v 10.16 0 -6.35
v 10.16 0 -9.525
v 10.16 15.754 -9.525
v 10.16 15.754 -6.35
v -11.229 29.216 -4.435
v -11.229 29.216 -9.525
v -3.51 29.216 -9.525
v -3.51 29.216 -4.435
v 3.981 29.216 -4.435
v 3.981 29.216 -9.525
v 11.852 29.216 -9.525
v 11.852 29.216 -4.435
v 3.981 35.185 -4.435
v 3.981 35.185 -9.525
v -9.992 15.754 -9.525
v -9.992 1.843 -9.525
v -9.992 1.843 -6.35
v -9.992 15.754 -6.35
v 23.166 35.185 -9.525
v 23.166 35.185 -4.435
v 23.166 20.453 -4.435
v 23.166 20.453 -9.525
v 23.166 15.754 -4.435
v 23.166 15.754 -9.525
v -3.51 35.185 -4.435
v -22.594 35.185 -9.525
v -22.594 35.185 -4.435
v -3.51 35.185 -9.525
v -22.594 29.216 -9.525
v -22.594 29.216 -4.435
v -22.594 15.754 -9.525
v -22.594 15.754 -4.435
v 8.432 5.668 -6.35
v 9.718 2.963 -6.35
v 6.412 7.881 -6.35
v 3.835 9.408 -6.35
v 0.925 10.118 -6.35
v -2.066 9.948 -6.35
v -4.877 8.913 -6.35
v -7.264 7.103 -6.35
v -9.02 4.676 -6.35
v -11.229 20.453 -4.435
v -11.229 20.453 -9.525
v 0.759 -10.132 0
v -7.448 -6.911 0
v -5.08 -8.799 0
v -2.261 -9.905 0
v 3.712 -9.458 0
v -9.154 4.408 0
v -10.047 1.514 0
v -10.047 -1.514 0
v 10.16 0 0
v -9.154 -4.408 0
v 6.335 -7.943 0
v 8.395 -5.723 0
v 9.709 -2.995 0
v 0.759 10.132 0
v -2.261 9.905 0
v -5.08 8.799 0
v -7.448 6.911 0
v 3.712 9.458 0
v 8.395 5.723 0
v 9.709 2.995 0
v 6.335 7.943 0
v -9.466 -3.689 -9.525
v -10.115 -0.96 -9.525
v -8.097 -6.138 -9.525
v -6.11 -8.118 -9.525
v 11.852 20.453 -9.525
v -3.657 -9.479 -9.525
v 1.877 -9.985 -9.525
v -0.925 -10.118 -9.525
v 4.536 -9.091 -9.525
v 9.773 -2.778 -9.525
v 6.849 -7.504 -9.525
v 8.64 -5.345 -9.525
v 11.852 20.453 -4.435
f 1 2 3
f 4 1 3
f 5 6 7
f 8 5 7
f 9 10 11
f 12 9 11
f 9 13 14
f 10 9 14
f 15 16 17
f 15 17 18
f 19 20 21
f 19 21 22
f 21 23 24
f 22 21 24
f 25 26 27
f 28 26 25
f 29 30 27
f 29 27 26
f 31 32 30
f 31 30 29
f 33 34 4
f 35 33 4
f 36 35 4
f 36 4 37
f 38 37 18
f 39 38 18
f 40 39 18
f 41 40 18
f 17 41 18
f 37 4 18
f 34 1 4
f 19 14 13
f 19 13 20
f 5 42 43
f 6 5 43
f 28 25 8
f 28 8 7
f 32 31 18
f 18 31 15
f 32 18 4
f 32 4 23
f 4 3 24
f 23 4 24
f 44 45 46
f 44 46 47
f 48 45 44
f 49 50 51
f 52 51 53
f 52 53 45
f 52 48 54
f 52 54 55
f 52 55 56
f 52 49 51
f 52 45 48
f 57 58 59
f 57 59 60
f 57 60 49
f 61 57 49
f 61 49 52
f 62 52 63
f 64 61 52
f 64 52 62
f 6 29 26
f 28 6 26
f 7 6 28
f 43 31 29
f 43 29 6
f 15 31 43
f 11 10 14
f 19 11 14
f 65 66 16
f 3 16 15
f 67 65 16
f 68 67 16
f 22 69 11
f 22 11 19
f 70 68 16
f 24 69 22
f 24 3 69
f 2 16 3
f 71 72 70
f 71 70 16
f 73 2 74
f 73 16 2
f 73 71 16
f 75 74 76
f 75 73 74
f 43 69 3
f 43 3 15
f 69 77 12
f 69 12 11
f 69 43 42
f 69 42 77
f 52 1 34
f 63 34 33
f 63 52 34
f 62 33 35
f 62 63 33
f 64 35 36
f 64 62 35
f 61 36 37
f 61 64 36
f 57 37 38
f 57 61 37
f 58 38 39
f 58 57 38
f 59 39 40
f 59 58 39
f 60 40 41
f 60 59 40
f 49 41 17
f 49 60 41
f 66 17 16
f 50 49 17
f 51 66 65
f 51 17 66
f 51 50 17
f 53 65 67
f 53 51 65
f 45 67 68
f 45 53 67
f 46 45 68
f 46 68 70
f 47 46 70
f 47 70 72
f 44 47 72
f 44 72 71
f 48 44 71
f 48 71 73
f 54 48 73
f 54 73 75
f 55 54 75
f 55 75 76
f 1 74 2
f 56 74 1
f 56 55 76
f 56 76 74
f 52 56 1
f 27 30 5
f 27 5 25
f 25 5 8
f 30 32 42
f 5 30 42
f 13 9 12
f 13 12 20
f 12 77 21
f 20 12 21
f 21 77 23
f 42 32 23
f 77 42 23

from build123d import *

# Parameters (mm, degrees)
SKETCH1_R           = 10.16
BOSS_EXTRUDE1_DEPTH = 9.525
SKETCH2_W           = 20.151524415
SKETCH2_H           = 15.754496301
BOSS_EXTRUDE4_DEPTH = 3.175
BOSS_EXTRUDE5_DEPTH = 4.699
SKETCH4_W           = 11.36474419
SKETCH4_H           = 5.089940764
SKETCH4_W_2         = 11.314127359
BOSS_EXTRUDE6_DEPTH = 8.763
SKETCH5_W           = 19.083811061
SKETCH5_H           = 5.089940764
SKETCH5_W_2         = 19.185044725
BOSS_EXTRUDE7_DEPTH = 5.969


with BuildPart() as part:
    # Sketch1 → Boss-Extrude1 (new body)
    with BuildSketch(Plane.XY):
        Circle(SKETCH1_R)
    extrude(amount=-BOSS_EXTRUDE1_DEPTH)

    # Sketch2 → Boss-Extrude4 (add)
    with BuildSketch(Plane(origin=(0, 0, -9.525), x_dir=(-1, 0, 0), z_dir=(0, 0, -1))):
        with Locations((-0.084237792, 7.877248151)):
            Rectangle(SKETCH2_W, SKETCH2_H)
    extrude(amount=-BOSS_EXTRUDE4_DEPTH)

    # Sketch3 → Boss-Extrude5 (add)
    with BuildSketch(Plane(origin=(0, 15.754496301, 0), x_dir=(1, 0, 0), z_dir=(0, 1, 0))):
        Polygon((-9.991524415, 9.525), (-22.594029854, 9.525), (-22.594029854, 4.435059236), (23.166117059, 4.435059236), (23.166117059, 9.525), align=None)
    extrude(amount=BOSS_EXTRUDE5_DEPTH)

    # Sketch4 → Boss-Extrude6 (add)
    with BuildSketch(Plane(origin=(0, 20.453496301, 0), x_dir=(1, 0, 0), z_dir=(0, 1, 0))):
        with Locations((-16.911657759, 6.980029618)):
            Rectangle(SKETCH4_W, SKETCH4_H)
        with Locations((17.50905338, 6.980029618)):
            Rectangle(SKETCH4_W_2, SKETCH4_H)
    extrude(amount=BOSS_EXTRUDE6_DEPTH)

    # Sketch5 → Boss-Extrude7 (add)
    with BuildSketch(Plane(origin=(0, 29.216496301, 0), x_dir=(1, 0, 0), z_dir=(0, 1, 0))):
        with Locations((-13.052124324, 6.980029618)):
            Rectangle(SKETCH5_W, SKETCH5_H)
        with Locations((13.573594697, 6.980029618)):
            Rectangle(SKETCH5_W_2, SKETCH5_H)
    extrude(amount=BOSS_EXTRUDE7_DEPTH)


solid = part.part
